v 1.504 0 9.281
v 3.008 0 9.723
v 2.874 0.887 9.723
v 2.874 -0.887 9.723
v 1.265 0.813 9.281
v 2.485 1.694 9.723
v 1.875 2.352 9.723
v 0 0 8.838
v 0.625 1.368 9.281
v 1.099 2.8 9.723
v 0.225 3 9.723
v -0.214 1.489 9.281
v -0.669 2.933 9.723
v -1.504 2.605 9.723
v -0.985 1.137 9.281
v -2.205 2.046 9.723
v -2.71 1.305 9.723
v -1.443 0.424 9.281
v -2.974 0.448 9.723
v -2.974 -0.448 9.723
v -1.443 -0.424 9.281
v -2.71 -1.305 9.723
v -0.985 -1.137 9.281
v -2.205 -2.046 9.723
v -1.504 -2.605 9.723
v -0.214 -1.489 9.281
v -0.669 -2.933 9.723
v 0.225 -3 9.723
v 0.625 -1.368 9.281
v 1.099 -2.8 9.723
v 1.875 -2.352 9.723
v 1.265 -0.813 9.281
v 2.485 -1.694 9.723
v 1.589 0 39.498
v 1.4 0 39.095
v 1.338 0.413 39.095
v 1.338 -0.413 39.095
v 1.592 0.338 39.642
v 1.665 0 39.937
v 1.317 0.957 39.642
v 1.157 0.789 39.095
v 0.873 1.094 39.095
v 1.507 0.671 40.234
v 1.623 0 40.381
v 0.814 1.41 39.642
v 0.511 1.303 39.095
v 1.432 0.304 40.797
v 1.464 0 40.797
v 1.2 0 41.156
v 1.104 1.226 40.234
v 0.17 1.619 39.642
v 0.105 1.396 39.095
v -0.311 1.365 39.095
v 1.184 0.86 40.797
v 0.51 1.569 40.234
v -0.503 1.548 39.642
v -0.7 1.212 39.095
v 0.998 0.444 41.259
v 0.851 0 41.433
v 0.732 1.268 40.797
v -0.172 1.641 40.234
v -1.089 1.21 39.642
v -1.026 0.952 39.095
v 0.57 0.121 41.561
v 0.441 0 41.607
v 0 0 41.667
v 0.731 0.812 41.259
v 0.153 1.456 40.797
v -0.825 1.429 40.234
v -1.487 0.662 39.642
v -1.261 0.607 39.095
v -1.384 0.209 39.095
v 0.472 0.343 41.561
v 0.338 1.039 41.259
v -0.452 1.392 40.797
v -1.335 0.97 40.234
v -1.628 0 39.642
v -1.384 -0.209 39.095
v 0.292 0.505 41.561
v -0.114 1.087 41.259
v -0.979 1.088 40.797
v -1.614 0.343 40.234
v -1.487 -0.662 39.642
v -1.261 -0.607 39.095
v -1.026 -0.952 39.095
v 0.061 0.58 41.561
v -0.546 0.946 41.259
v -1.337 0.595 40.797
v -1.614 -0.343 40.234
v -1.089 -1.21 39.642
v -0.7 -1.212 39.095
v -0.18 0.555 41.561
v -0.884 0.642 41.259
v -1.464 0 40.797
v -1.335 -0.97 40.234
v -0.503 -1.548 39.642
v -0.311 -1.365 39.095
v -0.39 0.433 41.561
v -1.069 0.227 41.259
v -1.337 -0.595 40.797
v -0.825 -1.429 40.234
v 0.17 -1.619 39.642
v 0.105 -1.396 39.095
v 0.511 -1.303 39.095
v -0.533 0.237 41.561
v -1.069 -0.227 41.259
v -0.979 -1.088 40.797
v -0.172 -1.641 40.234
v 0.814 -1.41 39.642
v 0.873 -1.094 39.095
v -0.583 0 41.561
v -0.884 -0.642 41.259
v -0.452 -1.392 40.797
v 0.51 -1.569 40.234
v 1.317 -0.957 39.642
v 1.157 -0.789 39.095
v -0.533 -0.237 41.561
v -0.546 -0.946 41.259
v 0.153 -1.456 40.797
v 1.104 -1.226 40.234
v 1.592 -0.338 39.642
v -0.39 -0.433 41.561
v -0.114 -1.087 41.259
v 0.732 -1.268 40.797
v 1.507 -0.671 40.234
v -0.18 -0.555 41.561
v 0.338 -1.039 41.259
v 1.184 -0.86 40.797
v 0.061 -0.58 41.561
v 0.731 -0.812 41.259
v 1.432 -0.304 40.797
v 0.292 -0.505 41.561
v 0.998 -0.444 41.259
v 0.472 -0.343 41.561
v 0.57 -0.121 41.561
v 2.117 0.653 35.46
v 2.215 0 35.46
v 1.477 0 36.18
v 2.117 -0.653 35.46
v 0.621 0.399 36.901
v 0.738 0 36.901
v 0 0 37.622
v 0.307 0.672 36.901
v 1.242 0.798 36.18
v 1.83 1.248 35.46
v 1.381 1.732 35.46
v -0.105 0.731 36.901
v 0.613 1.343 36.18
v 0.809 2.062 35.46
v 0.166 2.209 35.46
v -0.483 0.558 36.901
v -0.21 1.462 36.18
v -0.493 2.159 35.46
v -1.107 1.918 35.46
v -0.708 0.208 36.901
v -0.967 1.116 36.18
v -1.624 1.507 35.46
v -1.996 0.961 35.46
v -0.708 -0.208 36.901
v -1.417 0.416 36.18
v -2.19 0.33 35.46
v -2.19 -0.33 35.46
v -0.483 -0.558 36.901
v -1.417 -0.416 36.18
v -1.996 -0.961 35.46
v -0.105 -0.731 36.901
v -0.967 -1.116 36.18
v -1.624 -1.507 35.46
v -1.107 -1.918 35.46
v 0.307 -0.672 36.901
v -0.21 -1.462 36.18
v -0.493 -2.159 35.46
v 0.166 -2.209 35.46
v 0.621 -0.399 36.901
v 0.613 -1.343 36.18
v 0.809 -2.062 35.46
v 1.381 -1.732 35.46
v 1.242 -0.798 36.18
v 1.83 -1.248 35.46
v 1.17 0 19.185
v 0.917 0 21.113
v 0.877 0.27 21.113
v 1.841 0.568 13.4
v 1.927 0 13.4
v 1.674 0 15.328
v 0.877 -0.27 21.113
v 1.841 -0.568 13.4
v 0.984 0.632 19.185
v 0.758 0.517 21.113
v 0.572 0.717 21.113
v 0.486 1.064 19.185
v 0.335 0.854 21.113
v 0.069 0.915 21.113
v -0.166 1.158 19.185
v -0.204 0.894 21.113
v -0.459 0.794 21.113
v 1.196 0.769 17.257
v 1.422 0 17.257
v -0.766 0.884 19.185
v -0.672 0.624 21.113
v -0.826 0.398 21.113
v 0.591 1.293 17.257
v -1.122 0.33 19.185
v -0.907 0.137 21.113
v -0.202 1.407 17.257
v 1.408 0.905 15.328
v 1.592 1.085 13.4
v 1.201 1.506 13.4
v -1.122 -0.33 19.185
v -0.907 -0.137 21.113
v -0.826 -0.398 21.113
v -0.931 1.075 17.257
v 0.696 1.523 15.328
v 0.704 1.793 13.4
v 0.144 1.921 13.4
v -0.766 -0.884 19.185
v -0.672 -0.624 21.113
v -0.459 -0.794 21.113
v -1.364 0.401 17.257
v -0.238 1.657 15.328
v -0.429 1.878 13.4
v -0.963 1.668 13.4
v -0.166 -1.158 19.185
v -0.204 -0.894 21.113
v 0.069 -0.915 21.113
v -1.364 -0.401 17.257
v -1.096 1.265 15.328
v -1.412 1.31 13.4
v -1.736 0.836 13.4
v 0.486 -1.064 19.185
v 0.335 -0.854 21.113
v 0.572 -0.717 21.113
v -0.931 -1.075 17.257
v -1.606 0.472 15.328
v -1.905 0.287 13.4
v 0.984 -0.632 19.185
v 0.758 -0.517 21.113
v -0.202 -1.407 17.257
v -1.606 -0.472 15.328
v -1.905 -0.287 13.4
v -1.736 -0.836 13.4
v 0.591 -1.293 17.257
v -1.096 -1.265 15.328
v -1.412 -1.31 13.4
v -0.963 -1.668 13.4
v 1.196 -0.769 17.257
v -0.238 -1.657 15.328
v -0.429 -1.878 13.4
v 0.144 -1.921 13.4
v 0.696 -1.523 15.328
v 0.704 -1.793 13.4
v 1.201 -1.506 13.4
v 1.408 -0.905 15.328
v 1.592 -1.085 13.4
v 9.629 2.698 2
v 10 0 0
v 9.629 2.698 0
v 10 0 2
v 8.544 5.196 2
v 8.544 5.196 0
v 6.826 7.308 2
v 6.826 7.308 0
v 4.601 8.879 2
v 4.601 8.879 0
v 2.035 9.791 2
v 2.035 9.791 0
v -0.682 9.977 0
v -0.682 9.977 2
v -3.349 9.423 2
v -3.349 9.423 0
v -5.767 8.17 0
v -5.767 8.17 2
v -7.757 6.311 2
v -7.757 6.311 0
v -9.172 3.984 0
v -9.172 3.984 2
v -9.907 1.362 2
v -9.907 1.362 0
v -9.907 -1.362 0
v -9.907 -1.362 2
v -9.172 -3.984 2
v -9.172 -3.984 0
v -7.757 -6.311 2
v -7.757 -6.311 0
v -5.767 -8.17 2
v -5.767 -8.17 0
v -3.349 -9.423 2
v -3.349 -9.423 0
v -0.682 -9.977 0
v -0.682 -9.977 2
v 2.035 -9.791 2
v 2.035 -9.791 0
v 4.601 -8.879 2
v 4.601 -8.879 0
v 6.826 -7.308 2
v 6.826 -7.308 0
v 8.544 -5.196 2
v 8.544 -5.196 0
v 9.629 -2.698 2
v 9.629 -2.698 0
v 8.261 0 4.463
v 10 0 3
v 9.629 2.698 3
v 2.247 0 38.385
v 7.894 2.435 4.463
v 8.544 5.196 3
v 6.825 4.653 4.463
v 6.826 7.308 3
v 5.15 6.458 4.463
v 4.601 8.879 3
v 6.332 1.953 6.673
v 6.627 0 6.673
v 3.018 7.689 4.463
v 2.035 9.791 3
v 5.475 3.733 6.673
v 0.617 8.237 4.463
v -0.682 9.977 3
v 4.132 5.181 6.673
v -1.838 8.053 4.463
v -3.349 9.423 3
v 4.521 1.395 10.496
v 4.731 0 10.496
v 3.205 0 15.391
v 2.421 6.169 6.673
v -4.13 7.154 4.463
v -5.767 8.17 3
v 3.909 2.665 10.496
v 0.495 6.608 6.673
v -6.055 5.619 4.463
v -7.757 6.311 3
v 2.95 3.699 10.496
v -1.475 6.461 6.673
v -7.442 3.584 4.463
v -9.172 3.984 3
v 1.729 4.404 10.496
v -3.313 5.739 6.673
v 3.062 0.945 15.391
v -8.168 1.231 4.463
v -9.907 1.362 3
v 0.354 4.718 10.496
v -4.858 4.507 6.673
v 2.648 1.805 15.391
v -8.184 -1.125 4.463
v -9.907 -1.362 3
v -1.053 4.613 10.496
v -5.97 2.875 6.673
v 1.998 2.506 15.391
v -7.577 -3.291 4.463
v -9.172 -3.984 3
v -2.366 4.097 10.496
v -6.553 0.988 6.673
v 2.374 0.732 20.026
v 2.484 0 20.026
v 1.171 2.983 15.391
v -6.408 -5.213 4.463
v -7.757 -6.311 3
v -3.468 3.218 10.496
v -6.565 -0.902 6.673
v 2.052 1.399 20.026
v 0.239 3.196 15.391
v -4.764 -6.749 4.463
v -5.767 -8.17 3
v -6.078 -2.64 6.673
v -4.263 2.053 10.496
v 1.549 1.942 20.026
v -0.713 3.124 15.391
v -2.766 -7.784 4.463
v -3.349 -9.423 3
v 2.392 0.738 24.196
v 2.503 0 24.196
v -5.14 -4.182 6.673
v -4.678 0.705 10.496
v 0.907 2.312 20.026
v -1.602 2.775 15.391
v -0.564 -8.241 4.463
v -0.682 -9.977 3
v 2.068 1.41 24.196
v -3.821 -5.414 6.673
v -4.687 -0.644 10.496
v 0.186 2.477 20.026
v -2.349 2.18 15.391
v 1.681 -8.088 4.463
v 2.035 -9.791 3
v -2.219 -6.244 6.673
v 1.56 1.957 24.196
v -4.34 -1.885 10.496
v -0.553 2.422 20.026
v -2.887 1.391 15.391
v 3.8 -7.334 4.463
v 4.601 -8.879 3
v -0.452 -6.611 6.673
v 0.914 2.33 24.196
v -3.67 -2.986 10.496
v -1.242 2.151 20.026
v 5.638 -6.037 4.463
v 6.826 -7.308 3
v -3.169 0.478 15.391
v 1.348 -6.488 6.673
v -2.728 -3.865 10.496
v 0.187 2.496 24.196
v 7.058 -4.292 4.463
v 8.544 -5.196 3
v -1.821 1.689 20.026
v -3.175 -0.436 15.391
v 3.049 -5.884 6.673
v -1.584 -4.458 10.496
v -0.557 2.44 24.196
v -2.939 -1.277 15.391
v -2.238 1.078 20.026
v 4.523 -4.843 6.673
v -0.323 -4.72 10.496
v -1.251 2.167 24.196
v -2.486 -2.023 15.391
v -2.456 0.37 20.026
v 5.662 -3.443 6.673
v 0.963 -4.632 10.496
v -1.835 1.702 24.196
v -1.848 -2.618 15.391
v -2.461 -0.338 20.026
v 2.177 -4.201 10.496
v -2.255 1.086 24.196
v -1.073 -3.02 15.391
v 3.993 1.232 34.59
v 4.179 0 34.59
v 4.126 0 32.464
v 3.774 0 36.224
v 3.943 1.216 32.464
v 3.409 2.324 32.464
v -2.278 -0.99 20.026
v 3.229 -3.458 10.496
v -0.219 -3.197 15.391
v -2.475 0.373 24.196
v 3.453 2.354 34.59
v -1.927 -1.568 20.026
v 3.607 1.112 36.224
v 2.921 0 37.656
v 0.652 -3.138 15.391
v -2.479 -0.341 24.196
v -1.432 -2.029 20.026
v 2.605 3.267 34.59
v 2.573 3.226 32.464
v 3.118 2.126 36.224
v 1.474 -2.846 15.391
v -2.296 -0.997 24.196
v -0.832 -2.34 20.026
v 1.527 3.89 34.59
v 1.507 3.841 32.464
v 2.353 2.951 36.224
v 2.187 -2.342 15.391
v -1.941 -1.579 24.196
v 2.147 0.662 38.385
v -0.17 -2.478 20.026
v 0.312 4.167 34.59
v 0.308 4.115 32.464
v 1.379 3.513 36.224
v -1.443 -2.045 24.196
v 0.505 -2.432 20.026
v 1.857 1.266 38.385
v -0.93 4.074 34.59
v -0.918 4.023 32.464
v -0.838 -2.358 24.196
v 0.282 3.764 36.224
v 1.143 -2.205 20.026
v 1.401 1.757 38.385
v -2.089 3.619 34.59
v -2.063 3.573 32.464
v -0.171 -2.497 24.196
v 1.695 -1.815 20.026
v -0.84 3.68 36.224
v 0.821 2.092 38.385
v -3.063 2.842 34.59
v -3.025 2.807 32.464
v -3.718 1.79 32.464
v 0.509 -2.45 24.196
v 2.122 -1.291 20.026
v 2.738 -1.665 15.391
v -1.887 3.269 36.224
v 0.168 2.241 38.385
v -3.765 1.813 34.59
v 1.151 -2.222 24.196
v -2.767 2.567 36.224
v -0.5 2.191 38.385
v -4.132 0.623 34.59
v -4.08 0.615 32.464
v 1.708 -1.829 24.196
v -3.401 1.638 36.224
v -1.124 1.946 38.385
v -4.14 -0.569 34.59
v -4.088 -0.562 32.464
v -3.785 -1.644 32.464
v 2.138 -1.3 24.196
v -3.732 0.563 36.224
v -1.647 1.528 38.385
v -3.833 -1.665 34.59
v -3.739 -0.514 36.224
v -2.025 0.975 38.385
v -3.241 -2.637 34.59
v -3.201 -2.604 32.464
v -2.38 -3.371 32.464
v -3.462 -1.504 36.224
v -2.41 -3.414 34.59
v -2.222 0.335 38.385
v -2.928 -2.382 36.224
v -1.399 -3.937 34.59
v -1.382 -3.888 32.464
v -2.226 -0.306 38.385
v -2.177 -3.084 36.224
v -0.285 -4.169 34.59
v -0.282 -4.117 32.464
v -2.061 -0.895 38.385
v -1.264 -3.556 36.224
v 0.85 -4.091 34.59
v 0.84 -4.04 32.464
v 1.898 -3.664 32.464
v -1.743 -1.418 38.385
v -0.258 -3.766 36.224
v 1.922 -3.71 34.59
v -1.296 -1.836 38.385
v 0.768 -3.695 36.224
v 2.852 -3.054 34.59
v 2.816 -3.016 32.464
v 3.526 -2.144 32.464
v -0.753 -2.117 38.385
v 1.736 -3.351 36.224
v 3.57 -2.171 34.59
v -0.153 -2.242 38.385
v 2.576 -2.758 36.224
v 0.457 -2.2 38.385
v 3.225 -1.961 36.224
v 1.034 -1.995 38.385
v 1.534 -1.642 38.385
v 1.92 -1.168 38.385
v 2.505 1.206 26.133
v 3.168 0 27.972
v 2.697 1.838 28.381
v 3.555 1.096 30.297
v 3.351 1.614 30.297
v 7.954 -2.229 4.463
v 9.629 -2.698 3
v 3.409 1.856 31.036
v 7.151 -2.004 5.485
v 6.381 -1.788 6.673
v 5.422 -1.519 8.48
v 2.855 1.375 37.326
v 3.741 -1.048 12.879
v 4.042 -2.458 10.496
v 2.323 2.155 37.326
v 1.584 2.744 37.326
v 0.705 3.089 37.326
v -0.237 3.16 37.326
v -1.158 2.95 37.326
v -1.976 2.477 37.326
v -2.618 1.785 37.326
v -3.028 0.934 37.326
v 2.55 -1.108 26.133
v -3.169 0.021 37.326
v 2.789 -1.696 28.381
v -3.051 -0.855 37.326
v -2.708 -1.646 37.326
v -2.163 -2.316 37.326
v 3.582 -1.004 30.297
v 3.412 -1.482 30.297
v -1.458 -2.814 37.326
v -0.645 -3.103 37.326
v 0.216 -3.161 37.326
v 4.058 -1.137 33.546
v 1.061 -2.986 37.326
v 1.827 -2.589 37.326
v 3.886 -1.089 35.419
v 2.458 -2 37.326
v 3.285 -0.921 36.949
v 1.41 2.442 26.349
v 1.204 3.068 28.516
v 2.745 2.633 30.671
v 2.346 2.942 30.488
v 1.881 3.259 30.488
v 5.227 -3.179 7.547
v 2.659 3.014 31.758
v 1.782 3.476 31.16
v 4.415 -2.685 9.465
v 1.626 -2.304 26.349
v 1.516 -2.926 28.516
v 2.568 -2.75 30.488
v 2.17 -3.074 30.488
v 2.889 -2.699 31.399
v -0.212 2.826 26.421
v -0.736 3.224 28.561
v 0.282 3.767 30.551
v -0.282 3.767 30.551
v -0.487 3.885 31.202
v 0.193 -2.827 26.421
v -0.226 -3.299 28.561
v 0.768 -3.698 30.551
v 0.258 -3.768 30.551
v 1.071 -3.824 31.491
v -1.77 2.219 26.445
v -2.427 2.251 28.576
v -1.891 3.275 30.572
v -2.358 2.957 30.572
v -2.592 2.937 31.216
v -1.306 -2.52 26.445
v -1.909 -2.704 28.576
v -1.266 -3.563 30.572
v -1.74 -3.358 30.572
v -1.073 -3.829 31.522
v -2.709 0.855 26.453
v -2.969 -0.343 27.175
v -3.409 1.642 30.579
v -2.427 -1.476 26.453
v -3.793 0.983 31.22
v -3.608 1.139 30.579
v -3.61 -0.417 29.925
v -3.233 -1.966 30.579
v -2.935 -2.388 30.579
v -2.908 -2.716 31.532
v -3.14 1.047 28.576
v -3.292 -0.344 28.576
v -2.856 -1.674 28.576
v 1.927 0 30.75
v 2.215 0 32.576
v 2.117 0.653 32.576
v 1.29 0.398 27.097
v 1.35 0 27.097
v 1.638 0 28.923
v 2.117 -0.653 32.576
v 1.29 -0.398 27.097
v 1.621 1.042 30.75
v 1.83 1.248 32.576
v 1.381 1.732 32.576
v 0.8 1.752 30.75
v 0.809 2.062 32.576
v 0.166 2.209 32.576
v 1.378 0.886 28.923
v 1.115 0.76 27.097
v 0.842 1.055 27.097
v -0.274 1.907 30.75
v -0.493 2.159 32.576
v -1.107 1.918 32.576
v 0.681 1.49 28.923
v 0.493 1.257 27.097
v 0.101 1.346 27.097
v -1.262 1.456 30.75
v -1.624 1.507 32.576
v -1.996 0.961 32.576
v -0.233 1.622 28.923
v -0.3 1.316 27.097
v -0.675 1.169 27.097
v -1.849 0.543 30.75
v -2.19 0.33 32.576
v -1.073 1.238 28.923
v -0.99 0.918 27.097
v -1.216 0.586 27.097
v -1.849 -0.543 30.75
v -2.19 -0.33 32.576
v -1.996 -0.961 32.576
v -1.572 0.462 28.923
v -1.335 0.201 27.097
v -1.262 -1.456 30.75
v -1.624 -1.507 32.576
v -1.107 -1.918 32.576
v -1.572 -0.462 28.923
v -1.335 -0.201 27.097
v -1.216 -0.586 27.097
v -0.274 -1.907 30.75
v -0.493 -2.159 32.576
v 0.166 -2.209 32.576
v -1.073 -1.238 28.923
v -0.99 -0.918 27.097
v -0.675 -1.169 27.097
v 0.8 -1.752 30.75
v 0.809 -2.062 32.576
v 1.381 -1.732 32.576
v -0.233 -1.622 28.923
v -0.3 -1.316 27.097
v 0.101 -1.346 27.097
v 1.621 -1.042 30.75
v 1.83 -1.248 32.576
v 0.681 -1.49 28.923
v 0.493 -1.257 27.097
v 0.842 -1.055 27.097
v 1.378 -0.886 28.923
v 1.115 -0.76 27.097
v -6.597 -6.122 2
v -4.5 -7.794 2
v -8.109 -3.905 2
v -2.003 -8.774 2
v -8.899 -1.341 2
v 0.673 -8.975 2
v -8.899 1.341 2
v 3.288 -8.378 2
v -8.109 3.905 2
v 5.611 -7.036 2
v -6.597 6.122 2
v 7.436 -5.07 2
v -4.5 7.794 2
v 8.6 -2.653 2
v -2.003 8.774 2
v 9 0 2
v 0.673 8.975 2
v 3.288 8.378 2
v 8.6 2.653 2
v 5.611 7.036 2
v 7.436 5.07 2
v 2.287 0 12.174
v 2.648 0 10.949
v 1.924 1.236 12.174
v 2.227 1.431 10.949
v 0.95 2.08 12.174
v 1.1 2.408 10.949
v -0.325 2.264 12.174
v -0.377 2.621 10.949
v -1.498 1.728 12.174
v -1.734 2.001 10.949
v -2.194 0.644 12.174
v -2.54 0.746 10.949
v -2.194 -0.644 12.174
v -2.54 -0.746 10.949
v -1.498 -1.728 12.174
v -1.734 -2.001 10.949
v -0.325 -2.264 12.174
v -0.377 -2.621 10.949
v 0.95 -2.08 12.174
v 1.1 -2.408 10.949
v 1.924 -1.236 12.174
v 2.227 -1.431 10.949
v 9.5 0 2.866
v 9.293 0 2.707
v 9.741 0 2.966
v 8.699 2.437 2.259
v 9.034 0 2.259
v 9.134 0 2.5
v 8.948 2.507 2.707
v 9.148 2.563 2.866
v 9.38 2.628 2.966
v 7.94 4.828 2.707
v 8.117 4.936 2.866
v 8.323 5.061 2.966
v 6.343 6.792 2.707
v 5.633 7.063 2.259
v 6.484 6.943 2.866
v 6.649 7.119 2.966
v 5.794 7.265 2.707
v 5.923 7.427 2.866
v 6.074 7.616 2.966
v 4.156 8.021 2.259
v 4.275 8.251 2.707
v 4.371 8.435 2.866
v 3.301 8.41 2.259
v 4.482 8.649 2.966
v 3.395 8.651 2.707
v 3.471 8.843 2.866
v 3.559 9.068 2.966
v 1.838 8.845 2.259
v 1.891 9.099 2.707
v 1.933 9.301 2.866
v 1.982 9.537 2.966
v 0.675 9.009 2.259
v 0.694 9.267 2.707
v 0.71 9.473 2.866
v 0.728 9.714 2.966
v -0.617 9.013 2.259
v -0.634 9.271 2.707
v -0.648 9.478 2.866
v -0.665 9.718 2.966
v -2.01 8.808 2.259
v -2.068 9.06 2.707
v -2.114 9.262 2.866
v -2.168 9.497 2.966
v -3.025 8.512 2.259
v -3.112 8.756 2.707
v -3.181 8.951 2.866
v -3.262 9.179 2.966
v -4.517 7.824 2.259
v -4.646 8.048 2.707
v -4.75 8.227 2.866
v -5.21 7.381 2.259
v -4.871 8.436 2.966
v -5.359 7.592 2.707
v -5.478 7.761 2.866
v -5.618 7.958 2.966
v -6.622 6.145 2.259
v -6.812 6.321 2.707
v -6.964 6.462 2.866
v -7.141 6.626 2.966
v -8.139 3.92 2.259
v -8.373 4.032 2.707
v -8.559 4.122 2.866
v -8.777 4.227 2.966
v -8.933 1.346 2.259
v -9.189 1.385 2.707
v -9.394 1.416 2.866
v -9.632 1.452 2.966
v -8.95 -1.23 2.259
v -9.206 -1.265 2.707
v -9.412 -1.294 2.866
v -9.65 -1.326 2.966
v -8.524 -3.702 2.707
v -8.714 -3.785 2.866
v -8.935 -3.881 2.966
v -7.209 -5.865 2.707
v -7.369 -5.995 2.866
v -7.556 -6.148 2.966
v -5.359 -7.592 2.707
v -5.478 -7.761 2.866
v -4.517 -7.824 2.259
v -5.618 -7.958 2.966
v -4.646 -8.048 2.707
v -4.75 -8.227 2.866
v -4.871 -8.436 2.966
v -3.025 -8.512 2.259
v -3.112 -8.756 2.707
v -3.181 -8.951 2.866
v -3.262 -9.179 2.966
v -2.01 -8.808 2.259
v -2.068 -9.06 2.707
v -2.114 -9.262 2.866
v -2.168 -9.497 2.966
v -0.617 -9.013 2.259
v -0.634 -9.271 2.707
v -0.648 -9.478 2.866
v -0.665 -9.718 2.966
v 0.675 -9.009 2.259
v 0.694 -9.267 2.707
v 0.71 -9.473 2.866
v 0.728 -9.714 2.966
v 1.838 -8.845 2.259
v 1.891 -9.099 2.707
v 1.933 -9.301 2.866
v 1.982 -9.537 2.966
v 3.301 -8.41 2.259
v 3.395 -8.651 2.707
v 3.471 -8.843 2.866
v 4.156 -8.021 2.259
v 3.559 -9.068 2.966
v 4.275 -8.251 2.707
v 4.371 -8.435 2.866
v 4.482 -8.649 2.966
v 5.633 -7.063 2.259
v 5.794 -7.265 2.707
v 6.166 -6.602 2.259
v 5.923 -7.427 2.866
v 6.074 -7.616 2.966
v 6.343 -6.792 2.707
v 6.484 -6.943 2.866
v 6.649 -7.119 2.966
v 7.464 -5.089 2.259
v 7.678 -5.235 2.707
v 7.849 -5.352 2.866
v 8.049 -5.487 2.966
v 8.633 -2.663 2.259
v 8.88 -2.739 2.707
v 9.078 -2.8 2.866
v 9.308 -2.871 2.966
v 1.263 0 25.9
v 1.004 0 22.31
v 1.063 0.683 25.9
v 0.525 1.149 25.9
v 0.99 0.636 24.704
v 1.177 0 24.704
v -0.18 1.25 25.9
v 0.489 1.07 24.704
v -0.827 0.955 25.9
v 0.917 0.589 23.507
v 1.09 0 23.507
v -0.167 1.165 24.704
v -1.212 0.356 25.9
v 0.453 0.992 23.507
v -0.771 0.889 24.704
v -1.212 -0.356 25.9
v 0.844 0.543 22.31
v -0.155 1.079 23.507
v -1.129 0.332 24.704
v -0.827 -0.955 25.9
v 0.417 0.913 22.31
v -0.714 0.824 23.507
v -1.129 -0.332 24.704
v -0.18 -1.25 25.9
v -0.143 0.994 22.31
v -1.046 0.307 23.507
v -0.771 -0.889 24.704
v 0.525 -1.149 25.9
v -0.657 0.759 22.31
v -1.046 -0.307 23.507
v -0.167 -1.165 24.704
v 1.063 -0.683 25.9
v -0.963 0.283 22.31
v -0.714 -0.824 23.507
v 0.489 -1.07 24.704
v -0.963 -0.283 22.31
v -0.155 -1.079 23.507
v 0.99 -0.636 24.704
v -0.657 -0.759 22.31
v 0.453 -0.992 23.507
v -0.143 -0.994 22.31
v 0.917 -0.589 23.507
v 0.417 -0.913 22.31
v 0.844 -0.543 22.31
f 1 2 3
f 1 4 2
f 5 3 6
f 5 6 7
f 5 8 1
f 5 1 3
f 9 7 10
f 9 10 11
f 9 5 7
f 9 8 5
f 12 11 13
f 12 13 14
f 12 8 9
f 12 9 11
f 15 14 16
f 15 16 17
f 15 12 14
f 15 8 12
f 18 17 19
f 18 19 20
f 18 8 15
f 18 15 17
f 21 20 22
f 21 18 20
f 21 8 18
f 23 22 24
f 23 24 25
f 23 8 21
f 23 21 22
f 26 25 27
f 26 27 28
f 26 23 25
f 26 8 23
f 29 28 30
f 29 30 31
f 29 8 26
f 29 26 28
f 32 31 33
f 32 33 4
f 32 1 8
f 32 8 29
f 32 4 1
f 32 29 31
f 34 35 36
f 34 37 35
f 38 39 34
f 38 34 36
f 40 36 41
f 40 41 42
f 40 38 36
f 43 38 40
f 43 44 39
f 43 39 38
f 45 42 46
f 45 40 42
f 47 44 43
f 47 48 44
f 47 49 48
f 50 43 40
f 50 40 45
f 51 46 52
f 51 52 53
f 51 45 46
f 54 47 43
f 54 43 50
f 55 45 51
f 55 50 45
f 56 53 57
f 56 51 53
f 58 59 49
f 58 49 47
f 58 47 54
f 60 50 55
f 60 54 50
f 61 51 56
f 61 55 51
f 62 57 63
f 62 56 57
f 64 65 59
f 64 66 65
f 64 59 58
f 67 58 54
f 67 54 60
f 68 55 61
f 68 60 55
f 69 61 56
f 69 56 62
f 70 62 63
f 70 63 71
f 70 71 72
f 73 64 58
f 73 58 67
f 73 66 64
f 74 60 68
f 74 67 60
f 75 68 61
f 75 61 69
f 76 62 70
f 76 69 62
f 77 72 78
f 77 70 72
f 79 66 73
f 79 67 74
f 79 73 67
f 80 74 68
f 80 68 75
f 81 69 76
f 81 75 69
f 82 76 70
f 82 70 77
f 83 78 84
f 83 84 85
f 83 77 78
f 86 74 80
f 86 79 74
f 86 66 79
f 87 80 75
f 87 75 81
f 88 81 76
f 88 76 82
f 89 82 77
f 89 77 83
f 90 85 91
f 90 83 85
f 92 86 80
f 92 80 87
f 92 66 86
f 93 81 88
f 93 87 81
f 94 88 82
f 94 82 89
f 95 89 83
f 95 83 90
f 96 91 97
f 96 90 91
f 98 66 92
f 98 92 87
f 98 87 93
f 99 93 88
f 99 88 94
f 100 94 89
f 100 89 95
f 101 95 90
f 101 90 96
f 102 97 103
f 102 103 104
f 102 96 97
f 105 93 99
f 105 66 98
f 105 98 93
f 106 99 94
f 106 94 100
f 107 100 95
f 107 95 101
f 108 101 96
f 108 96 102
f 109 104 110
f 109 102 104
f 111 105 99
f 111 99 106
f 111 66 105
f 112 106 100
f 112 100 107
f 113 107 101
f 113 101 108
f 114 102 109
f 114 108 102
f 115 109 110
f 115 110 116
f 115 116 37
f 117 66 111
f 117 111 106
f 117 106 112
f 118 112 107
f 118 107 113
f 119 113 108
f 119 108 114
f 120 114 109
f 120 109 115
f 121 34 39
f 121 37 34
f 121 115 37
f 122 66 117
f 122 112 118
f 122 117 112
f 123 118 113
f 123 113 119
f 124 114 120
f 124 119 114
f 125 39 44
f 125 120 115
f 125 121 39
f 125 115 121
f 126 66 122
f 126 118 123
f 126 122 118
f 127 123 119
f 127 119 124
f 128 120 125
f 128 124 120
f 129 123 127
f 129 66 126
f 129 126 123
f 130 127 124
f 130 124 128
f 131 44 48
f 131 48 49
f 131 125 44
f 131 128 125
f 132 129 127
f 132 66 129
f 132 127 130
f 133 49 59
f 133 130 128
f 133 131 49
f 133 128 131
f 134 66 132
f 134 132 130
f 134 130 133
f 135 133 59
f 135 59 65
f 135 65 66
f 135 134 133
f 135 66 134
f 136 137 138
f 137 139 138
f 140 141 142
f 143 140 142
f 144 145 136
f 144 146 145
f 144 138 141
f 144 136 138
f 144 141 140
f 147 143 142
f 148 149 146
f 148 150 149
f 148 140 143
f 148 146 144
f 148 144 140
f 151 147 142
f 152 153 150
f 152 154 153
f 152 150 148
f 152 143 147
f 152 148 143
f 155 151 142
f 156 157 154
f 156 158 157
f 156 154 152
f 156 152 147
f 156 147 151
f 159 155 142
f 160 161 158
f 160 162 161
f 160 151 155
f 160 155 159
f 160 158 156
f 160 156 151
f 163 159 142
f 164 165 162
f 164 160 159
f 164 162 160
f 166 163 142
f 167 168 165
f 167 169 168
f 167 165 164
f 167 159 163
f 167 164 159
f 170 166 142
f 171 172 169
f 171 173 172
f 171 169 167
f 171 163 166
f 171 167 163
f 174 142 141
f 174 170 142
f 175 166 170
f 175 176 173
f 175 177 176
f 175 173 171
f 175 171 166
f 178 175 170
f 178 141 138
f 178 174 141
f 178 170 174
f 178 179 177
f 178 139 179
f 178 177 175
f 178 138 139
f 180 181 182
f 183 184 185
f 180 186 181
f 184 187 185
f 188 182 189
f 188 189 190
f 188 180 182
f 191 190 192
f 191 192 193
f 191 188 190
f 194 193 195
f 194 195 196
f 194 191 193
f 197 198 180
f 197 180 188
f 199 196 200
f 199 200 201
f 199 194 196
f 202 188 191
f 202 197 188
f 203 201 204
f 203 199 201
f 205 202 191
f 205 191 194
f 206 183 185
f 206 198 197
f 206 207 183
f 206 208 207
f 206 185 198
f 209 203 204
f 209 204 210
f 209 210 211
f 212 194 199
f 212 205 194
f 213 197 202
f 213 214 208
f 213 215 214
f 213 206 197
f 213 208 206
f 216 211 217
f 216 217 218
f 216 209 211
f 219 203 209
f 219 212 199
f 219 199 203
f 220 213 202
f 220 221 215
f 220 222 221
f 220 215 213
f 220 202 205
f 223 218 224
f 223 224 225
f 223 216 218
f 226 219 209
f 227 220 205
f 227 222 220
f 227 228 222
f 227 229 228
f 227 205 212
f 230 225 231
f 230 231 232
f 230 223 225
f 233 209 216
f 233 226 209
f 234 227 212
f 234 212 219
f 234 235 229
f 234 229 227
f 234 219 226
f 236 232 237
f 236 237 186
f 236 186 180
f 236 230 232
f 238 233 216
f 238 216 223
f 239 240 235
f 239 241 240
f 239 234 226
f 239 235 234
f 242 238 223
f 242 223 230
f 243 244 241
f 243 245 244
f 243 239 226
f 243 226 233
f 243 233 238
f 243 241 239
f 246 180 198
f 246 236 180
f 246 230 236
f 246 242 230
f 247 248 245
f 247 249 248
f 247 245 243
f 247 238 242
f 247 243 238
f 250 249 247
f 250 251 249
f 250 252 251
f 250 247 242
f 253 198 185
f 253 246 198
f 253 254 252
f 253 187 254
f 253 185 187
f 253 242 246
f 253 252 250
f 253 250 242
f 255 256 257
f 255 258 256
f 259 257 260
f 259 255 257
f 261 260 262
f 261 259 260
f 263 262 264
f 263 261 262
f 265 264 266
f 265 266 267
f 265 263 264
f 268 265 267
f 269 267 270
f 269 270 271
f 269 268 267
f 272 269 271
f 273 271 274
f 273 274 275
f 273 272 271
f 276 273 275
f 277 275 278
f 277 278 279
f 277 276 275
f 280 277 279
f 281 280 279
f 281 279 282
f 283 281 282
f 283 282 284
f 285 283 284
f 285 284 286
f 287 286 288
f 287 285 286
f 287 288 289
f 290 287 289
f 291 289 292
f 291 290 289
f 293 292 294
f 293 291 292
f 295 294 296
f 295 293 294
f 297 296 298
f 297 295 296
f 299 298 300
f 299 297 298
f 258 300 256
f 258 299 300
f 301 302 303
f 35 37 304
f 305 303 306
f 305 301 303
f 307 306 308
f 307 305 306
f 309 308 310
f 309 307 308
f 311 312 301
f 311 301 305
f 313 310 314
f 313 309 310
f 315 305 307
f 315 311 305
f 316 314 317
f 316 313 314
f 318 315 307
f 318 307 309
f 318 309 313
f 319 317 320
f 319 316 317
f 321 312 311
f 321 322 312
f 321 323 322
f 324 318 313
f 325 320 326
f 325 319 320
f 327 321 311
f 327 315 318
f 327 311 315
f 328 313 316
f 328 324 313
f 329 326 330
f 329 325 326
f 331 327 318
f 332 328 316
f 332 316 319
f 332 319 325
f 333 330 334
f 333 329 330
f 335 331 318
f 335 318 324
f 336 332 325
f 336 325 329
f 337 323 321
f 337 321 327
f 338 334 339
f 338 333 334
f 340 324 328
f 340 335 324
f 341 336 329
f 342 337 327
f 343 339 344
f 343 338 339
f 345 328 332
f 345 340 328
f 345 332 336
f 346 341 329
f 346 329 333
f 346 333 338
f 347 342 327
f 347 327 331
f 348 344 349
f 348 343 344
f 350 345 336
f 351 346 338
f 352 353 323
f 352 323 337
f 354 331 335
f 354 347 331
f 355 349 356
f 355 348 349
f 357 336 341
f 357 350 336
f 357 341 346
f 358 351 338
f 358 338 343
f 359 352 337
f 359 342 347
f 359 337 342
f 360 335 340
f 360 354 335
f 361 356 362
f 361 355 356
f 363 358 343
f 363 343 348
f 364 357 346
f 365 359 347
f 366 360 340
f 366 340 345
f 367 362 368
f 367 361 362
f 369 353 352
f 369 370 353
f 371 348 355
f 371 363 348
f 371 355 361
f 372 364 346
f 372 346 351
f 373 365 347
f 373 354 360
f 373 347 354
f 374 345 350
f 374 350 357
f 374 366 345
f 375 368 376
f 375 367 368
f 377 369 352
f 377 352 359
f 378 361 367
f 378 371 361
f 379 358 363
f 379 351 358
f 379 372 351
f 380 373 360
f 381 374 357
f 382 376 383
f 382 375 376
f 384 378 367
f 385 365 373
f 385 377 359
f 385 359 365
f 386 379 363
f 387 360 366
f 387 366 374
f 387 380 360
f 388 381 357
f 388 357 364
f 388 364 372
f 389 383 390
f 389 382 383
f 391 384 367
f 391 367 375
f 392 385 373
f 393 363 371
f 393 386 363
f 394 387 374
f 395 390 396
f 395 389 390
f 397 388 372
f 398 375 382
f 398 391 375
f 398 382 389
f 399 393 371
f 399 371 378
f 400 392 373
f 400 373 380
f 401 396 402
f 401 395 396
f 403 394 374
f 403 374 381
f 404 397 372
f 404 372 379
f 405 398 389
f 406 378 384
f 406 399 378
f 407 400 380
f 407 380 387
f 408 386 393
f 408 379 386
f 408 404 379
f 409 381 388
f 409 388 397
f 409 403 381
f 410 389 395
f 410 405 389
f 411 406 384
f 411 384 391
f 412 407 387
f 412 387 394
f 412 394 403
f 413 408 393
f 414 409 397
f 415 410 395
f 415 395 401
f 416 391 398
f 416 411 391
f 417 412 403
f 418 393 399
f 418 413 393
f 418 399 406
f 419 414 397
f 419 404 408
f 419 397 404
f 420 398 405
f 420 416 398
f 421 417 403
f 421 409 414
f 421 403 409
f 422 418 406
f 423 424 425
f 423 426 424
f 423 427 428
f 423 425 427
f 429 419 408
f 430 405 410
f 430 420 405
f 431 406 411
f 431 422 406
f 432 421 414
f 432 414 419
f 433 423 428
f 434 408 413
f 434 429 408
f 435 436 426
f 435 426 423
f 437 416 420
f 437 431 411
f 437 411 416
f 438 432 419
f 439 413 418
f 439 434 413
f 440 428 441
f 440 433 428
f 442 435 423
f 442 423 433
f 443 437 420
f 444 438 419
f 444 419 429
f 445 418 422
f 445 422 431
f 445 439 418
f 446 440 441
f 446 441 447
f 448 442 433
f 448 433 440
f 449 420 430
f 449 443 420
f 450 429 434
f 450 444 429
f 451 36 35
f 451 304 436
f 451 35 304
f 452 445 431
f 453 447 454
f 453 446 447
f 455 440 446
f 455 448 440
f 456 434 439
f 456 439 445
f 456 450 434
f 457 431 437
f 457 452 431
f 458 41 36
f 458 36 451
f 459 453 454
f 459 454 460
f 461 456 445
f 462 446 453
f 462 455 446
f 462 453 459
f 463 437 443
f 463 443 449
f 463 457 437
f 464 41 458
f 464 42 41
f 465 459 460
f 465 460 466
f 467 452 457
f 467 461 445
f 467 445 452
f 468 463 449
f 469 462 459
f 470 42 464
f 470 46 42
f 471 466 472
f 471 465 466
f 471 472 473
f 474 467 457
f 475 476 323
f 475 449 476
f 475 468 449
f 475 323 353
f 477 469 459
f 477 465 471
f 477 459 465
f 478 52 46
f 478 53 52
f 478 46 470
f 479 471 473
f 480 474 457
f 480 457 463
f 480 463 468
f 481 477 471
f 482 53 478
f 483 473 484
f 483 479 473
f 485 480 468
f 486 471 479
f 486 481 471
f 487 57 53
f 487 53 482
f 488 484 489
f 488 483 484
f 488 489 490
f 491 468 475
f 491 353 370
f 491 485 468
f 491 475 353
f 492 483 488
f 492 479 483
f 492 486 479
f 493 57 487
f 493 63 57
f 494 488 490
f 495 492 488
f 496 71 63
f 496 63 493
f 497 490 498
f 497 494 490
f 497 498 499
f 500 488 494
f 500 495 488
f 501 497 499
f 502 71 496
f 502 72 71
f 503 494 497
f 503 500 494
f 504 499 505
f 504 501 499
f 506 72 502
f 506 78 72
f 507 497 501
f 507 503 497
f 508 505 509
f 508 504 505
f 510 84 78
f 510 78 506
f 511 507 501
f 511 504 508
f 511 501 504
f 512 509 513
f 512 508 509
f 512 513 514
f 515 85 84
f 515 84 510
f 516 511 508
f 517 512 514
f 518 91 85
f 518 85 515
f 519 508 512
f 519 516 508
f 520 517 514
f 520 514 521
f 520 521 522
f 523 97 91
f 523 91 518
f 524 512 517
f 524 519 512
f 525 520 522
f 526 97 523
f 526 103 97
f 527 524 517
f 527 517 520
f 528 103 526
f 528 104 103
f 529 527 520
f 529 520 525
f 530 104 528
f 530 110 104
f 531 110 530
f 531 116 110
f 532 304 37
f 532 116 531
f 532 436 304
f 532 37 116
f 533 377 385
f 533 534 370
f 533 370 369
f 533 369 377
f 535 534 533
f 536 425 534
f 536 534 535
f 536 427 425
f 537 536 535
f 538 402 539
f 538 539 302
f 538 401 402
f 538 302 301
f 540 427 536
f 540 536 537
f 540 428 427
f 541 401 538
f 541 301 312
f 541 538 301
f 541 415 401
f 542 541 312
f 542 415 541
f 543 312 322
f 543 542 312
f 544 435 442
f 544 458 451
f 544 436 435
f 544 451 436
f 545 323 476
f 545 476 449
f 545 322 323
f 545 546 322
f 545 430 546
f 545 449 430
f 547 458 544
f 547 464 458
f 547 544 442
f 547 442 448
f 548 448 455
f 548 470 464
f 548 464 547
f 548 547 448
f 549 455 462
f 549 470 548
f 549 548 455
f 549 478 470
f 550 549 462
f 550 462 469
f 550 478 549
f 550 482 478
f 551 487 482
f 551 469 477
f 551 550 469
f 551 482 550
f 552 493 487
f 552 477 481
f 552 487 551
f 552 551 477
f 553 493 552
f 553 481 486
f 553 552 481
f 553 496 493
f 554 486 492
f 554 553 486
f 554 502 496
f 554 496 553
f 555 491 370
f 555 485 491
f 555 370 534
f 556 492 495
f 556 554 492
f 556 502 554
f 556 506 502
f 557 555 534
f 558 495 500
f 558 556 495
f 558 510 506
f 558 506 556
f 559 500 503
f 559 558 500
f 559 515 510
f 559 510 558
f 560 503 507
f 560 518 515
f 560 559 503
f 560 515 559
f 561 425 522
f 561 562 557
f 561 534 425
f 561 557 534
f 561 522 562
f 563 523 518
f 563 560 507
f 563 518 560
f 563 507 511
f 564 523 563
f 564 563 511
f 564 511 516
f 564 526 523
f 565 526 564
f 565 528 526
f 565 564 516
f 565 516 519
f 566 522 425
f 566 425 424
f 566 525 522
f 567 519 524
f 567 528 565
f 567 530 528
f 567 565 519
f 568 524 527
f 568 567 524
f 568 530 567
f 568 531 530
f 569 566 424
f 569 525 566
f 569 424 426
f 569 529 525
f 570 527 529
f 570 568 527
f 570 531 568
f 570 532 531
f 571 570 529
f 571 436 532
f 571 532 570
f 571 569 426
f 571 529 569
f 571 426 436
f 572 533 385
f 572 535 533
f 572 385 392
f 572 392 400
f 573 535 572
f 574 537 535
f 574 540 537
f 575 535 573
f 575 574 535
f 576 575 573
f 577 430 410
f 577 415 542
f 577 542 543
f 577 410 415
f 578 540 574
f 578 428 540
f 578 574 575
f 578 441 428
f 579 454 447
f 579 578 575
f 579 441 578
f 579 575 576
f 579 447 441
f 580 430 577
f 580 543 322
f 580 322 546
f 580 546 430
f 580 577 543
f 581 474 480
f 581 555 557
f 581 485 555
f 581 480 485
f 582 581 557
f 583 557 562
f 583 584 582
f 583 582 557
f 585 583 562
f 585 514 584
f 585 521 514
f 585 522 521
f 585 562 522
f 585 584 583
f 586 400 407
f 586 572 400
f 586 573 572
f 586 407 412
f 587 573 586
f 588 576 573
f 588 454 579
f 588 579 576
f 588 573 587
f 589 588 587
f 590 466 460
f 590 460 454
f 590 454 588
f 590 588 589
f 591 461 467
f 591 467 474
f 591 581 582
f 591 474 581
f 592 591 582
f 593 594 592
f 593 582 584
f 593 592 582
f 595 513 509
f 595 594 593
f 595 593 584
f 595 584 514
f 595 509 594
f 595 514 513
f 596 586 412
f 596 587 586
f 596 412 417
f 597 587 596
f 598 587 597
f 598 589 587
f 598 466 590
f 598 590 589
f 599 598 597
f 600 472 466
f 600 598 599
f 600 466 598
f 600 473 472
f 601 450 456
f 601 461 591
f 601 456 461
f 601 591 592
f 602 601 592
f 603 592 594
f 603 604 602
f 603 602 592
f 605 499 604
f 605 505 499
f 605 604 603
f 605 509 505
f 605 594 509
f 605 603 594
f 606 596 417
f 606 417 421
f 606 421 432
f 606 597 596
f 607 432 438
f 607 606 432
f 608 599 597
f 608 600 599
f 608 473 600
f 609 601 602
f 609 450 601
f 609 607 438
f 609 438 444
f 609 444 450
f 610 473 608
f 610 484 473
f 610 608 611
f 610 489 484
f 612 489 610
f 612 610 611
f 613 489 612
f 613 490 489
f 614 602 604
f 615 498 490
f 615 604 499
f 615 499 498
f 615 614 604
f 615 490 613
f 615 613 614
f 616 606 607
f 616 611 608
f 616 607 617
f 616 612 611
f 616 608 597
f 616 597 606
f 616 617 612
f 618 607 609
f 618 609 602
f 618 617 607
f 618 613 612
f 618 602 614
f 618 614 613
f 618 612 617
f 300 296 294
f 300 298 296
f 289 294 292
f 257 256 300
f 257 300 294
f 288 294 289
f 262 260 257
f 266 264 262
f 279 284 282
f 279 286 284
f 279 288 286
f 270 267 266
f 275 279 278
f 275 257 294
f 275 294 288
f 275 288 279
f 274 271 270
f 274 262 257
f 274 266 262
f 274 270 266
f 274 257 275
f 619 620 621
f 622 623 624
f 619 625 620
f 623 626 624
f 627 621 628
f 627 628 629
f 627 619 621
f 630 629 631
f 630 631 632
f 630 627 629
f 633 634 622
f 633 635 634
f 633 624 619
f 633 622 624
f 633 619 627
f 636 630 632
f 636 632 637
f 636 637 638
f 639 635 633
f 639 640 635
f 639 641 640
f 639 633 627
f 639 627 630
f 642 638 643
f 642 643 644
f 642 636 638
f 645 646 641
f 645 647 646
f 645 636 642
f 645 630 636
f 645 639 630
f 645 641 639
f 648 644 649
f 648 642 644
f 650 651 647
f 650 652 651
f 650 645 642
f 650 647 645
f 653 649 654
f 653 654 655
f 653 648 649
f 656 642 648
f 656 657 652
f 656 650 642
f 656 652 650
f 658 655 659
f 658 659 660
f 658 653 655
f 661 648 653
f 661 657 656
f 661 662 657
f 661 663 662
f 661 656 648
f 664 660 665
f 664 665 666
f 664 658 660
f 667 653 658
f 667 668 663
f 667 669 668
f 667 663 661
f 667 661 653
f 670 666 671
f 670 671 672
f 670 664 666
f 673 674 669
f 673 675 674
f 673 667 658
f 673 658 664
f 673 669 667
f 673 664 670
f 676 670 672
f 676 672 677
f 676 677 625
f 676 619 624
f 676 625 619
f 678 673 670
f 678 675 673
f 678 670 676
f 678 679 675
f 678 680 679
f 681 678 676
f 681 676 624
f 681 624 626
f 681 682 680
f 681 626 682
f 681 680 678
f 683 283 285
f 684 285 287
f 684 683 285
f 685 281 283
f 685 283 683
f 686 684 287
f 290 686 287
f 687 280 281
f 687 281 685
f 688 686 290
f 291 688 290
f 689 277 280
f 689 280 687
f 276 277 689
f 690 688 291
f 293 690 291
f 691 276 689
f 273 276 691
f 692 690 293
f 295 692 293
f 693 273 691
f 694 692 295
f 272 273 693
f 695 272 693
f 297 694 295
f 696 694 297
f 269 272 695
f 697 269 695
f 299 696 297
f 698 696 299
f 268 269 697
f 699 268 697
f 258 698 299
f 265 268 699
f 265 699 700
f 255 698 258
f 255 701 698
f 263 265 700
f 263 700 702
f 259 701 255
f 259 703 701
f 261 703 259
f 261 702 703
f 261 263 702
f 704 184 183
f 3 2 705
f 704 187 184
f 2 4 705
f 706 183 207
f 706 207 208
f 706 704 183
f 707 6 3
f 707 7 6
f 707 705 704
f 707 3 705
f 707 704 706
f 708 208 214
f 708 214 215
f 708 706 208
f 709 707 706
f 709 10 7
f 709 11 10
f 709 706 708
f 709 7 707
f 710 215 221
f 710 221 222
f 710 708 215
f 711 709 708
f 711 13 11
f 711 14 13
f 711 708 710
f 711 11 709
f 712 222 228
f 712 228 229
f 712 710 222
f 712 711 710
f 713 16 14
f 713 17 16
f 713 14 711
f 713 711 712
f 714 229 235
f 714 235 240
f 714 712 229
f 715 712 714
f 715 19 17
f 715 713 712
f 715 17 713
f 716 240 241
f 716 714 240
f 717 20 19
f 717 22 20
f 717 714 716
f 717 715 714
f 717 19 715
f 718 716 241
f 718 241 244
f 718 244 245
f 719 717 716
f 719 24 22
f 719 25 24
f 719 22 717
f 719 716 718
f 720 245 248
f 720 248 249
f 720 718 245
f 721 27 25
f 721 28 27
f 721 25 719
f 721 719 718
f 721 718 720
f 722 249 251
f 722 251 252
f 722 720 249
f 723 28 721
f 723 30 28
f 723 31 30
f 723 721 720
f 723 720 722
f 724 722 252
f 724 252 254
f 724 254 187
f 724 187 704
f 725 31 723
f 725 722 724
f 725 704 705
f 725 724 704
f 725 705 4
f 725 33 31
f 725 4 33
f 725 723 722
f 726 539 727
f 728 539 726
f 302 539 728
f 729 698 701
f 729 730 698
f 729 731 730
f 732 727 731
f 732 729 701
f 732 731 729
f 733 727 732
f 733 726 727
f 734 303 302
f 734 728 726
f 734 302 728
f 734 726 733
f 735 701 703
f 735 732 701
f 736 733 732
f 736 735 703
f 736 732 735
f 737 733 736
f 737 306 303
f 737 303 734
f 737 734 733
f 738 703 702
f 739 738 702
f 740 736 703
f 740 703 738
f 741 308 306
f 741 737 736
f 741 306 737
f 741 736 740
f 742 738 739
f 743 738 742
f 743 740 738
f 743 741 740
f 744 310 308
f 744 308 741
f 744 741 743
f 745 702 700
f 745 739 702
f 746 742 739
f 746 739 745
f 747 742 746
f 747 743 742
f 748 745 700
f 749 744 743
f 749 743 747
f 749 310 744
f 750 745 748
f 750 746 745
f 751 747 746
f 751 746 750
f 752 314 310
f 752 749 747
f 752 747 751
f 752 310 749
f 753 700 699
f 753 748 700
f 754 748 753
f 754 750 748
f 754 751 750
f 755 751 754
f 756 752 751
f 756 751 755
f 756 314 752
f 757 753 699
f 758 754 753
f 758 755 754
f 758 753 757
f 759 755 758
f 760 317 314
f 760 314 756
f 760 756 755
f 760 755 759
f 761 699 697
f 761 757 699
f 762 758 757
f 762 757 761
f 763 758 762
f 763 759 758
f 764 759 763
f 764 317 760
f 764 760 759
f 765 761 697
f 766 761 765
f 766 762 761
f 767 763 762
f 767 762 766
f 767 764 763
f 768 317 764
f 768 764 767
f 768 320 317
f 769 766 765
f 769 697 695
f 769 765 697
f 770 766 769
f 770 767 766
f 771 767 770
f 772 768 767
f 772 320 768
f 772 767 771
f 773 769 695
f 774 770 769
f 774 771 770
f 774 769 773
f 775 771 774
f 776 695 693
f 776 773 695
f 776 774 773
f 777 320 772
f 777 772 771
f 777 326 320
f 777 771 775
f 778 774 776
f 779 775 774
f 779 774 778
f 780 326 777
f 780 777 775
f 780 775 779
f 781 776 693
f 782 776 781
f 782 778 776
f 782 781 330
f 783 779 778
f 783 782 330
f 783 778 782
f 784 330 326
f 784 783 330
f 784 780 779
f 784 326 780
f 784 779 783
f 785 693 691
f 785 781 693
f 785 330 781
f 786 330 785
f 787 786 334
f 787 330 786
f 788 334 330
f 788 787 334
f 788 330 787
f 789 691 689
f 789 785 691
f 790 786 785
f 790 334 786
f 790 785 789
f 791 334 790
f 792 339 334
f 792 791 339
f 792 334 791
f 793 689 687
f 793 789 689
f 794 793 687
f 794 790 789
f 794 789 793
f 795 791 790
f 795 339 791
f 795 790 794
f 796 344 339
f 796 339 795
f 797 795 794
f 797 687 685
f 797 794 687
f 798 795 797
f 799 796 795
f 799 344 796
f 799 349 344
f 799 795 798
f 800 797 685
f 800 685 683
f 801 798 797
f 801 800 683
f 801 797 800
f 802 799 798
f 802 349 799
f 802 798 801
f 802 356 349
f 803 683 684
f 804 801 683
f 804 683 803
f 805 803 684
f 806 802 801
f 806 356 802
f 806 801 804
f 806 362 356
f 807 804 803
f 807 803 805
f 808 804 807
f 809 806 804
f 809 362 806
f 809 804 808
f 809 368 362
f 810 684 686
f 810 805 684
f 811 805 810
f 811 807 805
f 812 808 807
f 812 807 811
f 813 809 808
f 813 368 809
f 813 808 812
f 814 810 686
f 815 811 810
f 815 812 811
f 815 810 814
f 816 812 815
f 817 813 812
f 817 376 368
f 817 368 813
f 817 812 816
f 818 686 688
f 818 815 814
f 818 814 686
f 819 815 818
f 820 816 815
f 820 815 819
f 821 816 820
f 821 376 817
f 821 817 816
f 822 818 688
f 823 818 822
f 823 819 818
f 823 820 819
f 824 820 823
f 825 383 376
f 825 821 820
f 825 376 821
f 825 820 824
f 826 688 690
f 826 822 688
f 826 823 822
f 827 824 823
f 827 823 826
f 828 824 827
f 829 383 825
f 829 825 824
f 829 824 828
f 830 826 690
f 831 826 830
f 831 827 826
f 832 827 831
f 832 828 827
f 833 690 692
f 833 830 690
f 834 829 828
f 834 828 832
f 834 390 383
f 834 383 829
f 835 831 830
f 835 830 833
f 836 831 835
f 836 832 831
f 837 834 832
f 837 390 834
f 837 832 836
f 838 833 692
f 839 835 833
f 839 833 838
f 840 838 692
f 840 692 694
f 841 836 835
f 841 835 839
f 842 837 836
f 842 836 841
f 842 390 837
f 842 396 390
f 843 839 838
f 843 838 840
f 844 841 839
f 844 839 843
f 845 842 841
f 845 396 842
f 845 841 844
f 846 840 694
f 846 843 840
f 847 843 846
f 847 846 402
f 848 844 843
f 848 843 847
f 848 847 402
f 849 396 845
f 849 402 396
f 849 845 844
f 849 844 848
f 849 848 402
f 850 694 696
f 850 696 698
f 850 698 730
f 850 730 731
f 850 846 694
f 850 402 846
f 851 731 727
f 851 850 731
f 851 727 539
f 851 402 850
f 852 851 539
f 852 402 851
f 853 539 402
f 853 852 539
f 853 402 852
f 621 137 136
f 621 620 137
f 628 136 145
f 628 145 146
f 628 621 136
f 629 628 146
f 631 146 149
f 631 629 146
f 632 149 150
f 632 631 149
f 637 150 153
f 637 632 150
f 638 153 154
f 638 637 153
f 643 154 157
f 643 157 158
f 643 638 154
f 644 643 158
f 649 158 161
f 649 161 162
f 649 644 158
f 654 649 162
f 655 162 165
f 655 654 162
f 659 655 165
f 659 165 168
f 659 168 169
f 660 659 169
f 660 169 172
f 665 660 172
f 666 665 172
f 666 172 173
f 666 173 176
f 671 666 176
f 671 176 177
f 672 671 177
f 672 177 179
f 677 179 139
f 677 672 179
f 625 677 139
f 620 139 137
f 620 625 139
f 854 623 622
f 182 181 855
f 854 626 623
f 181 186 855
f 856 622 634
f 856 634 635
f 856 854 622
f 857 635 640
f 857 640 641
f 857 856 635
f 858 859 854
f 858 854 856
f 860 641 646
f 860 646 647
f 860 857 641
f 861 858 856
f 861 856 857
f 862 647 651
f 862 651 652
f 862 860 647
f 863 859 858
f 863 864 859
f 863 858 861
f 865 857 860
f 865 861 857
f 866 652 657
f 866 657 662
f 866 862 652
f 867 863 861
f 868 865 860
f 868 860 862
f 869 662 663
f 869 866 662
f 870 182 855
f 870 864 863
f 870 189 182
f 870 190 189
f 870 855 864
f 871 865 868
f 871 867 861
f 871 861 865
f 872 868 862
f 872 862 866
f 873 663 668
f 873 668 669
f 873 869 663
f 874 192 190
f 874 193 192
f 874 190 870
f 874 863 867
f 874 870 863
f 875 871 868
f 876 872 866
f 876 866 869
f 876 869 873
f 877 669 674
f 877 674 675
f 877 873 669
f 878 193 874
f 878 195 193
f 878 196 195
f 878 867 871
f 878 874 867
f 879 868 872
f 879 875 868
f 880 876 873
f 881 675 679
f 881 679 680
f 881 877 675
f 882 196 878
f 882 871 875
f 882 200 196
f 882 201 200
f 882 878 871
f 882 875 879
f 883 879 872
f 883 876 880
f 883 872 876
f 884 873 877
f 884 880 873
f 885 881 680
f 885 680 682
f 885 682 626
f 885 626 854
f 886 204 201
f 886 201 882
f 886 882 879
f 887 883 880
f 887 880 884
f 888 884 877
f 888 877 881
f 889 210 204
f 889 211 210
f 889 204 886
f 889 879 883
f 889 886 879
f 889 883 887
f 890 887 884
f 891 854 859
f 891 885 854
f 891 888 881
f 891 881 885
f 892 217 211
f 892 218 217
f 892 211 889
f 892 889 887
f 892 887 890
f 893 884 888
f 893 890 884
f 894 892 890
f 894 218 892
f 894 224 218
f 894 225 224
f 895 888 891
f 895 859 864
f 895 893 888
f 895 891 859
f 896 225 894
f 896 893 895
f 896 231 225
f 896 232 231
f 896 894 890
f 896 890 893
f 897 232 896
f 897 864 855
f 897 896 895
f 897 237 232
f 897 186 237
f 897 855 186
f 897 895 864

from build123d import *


with BuildPart() as f1:
    # F0 (on Front) → F1 (revolve)
    with BuildSketch(Plane.XZ):
        with BuildLine():
            Line((0, 8.8382818858), (0, 0))
            Line((0, 0), (10, 0))
            Line((10, 0), (10, 2))
            Line((10, 2), (9, 2))
            ThreePointArc((9, 2), (9.2928932188, 2.7071067812), (10, 3))
            add(Edge.make_bspline(
                [(10, 3), (5.6970222105, 5.5161274686), (-1.3836503017, 24.4209409655), (6.6211349569, 35.1973583272), (1.3998154741, 39.0954037275)],
                knots=[0, 0, 0, 0, 0.5419605204, 0.9666014846, 0.9666014846, 0.9666014846, 0.9666014846], degree=3))
            ThreePointArc((1.3998154741, 39.0954037275), (0.7969056794, 38.5361970365), (0, 38.3333333333))
            Line((0, 38.3333333333), (0, 37.6222543418))
            Line((0, 37.6222543418), (2.2149570286, 35.4595184326))
            Line((2.2149570286, 35.4595184326), (2.2149570286, 32.5758717954))
            Line((2.2149570286, 32.5758717954), (1.3498631306, 27.0969439298))
            Line((1.3498631306, 27.0969439298), (0.9173162398, 21.1133789271))
            Line((0.9173162398, 21.1133789271), (1.9265923183, 13.3996251971))
            Line((1.9265923183, 13.3996251971), (3.0079598073, 9.722976014))
            Line((3.0079598073, 9.722976014), (0, 8.8382818858))
        make_face()
        with BuildLine():
            Line((0, 41.6666666667), (0, 40))
            add(Edge.make_bspline(
                [(1.3998154741, 39.0954037275), (0.9891525046, 39.4019896211), (0.5244366288, 39.7034029043), (0, 40)],
                knots=[0.9666014846, 0.9666014846, 0.9666014846, 0.9666014846, 1, 1, 1, 1], degree=3))
            ThreePointArc((1.3998154741, 39.0954037275), (1.4638029635, 40.7969056794), (0, 41.6666666667))
        make_face()
        with BuildLine():
            Line((0, 40), (0, 38.3333333333))
            ThreePointArc((0, 38.3333333333), (0.7969056794, 38.5361970365), (1.3998154741, 39.0954037275))
            add(Edge.make_bspline(
                [(1.3998154741, 39.0954037275), (0.9891525046, 39.4019896211), (0.5244366288, 39.7034029043), (0, 40)],
                knots=[0.9666014846, 0.9666014846, 0.9666014846, 0.9666014846, 1, 1, 1, 1], degree=3))
        make_face()
    revolve(axis=Axis((0, 0, 20), (0, 0, 1)))


solid = f1.part
